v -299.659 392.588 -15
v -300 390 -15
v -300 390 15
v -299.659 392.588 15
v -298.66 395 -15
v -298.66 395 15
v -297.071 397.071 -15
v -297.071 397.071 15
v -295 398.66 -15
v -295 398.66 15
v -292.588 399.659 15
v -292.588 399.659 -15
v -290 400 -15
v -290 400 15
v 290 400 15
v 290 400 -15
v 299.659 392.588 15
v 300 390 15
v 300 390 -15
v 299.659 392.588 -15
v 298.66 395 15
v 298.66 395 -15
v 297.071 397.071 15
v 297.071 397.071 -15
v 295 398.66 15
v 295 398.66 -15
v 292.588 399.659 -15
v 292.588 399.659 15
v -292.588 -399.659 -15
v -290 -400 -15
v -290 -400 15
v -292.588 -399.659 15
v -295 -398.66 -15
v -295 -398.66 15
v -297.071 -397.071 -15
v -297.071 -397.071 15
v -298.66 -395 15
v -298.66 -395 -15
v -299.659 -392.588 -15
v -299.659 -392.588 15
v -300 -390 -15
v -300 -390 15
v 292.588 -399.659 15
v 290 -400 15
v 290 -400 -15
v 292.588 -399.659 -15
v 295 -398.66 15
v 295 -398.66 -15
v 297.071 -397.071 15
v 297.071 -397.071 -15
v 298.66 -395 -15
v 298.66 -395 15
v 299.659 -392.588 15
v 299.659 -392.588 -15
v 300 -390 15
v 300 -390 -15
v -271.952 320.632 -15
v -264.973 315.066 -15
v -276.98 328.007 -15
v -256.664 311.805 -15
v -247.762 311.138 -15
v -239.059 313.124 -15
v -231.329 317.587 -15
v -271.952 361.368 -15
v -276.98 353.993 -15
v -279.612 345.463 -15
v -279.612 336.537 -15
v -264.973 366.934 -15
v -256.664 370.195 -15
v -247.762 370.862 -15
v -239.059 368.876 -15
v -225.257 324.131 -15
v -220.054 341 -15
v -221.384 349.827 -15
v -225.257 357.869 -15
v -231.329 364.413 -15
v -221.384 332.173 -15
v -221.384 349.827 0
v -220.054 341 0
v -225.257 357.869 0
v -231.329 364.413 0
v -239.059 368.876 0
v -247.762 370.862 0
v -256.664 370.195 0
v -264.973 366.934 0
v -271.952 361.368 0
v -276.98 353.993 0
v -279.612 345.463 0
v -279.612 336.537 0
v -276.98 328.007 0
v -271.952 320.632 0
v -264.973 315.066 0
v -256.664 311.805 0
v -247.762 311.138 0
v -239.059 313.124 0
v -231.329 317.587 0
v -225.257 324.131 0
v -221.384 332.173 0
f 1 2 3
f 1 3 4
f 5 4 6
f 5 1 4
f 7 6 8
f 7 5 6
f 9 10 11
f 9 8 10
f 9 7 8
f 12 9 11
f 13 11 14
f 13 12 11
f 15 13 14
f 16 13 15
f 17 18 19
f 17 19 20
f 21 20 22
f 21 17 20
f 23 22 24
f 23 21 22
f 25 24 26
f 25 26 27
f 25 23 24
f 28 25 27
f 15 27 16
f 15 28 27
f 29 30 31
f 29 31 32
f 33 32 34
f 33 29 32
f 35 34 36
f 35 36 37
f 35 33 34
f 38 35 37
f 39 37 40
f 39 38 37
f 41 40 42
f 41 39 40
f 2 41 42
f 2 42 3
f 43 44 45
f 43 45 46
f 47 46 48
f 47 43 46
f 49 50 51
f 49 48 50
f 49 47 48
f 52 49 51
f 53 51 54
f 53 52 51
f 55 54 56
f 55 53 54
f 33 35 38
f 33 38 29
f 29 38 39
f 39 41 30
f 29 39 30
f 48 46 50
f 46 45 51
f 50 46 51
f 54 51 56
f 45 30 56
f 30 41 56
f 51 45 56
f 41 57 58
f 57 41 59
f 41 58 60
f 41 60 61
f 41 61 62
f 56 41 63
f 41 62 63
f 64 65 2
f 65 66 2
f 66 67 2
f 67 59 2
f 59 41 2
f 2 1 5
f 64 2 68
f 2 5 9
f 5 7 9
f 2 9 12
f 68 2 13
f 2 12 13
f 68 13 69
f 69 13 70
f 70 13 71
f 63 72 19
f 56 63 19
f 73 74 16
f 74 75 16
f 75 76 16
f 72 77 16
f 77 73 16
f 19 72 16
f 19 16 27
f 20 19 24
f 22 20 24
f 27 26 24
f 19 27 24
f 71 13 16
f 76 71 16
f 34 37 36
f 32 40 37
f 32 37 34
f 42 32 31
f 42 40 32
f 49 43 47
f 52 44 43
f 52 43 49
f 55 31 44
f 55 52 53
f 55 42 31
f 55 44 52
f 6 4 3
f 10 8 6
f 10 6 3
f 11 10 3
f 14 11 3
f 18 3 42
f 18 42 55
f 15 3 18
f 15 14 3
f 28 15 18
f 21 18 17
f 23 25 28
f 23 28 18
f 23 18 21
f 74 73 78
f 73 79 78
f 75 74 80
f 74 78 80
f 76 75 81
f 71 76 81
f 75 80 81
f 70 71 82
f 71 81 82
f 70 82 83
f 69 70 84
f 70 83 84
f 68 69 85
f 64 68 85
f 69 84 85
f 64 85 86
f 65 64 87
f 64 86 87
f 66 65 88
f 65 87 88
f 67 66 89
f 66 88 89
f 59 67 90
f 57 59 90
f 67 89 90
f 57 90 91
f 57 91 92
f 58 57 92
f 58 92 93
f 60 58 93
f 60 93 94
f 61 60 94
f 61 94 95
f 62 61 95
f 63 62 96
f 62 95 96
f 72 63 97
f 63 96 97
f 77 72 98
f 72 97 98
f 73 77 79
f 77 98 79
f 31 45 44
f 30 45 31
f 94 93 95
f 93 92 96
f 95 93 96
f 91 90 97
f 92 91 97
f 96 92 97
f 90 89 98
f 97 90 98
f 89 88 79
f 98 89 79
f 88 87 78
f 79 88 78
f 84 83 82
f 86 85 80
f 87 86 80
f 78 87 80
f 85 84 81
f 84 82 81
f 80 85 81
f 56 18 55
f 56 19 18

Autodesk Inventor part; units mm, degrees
sketch "Sketch1" plane through (0, 0, 0) normal (0, 0, 1) x (1, 0, 0)
  line L0 (300, -400) -> (-300, -400)
  line L1 (-300, -400) -> (-300, 400)
  line L2 (-300, 400) -> (300, 400)
  line L3 (300, 400) -> (300, -400)
  line L4 (300, -400) -> (-300, 400) construction
  line L5 (-300, -400) -> (300, 400) construction
  point P0 (0, 0)
  dimension "d1" = 600
  dimension "d2" = 800
extrude "Extrusion1" add sketch "Sketch1" along normal mid plane 30
fillet "Fillet1" radius 10 1 edges at (300, 400, 0)
fillet "Fillet2" radius 10 1 edges at (300, -400, 0)
fillet "Fillet3" radius 10 2 edges at (-300, -400, 0) (-300, 400, 0)
sketch "Sketch6" plane through (0, 0, 0) normal (0, 0, 1) x (1, 0, 0)
  line L0 (-300, -390) -> (-300, 390) projected
  line L1 (-290, 400) -> (290, 400) projected
  circle A0 centre (-250, 341) radius 29.946
  point P0 (0, 0)
  dimension "d29" = 50
  dimension "d30" = 59
sketch "Sketch7" plane through (0, 0, 0) normal (0, 0, 1) x (1, 0, 0)
  point P0 (0, 0)
extrude "Extrusion3" cut sketch "Sketch6" against normal blind 30
properties part number "Mesa_ergonomica"
